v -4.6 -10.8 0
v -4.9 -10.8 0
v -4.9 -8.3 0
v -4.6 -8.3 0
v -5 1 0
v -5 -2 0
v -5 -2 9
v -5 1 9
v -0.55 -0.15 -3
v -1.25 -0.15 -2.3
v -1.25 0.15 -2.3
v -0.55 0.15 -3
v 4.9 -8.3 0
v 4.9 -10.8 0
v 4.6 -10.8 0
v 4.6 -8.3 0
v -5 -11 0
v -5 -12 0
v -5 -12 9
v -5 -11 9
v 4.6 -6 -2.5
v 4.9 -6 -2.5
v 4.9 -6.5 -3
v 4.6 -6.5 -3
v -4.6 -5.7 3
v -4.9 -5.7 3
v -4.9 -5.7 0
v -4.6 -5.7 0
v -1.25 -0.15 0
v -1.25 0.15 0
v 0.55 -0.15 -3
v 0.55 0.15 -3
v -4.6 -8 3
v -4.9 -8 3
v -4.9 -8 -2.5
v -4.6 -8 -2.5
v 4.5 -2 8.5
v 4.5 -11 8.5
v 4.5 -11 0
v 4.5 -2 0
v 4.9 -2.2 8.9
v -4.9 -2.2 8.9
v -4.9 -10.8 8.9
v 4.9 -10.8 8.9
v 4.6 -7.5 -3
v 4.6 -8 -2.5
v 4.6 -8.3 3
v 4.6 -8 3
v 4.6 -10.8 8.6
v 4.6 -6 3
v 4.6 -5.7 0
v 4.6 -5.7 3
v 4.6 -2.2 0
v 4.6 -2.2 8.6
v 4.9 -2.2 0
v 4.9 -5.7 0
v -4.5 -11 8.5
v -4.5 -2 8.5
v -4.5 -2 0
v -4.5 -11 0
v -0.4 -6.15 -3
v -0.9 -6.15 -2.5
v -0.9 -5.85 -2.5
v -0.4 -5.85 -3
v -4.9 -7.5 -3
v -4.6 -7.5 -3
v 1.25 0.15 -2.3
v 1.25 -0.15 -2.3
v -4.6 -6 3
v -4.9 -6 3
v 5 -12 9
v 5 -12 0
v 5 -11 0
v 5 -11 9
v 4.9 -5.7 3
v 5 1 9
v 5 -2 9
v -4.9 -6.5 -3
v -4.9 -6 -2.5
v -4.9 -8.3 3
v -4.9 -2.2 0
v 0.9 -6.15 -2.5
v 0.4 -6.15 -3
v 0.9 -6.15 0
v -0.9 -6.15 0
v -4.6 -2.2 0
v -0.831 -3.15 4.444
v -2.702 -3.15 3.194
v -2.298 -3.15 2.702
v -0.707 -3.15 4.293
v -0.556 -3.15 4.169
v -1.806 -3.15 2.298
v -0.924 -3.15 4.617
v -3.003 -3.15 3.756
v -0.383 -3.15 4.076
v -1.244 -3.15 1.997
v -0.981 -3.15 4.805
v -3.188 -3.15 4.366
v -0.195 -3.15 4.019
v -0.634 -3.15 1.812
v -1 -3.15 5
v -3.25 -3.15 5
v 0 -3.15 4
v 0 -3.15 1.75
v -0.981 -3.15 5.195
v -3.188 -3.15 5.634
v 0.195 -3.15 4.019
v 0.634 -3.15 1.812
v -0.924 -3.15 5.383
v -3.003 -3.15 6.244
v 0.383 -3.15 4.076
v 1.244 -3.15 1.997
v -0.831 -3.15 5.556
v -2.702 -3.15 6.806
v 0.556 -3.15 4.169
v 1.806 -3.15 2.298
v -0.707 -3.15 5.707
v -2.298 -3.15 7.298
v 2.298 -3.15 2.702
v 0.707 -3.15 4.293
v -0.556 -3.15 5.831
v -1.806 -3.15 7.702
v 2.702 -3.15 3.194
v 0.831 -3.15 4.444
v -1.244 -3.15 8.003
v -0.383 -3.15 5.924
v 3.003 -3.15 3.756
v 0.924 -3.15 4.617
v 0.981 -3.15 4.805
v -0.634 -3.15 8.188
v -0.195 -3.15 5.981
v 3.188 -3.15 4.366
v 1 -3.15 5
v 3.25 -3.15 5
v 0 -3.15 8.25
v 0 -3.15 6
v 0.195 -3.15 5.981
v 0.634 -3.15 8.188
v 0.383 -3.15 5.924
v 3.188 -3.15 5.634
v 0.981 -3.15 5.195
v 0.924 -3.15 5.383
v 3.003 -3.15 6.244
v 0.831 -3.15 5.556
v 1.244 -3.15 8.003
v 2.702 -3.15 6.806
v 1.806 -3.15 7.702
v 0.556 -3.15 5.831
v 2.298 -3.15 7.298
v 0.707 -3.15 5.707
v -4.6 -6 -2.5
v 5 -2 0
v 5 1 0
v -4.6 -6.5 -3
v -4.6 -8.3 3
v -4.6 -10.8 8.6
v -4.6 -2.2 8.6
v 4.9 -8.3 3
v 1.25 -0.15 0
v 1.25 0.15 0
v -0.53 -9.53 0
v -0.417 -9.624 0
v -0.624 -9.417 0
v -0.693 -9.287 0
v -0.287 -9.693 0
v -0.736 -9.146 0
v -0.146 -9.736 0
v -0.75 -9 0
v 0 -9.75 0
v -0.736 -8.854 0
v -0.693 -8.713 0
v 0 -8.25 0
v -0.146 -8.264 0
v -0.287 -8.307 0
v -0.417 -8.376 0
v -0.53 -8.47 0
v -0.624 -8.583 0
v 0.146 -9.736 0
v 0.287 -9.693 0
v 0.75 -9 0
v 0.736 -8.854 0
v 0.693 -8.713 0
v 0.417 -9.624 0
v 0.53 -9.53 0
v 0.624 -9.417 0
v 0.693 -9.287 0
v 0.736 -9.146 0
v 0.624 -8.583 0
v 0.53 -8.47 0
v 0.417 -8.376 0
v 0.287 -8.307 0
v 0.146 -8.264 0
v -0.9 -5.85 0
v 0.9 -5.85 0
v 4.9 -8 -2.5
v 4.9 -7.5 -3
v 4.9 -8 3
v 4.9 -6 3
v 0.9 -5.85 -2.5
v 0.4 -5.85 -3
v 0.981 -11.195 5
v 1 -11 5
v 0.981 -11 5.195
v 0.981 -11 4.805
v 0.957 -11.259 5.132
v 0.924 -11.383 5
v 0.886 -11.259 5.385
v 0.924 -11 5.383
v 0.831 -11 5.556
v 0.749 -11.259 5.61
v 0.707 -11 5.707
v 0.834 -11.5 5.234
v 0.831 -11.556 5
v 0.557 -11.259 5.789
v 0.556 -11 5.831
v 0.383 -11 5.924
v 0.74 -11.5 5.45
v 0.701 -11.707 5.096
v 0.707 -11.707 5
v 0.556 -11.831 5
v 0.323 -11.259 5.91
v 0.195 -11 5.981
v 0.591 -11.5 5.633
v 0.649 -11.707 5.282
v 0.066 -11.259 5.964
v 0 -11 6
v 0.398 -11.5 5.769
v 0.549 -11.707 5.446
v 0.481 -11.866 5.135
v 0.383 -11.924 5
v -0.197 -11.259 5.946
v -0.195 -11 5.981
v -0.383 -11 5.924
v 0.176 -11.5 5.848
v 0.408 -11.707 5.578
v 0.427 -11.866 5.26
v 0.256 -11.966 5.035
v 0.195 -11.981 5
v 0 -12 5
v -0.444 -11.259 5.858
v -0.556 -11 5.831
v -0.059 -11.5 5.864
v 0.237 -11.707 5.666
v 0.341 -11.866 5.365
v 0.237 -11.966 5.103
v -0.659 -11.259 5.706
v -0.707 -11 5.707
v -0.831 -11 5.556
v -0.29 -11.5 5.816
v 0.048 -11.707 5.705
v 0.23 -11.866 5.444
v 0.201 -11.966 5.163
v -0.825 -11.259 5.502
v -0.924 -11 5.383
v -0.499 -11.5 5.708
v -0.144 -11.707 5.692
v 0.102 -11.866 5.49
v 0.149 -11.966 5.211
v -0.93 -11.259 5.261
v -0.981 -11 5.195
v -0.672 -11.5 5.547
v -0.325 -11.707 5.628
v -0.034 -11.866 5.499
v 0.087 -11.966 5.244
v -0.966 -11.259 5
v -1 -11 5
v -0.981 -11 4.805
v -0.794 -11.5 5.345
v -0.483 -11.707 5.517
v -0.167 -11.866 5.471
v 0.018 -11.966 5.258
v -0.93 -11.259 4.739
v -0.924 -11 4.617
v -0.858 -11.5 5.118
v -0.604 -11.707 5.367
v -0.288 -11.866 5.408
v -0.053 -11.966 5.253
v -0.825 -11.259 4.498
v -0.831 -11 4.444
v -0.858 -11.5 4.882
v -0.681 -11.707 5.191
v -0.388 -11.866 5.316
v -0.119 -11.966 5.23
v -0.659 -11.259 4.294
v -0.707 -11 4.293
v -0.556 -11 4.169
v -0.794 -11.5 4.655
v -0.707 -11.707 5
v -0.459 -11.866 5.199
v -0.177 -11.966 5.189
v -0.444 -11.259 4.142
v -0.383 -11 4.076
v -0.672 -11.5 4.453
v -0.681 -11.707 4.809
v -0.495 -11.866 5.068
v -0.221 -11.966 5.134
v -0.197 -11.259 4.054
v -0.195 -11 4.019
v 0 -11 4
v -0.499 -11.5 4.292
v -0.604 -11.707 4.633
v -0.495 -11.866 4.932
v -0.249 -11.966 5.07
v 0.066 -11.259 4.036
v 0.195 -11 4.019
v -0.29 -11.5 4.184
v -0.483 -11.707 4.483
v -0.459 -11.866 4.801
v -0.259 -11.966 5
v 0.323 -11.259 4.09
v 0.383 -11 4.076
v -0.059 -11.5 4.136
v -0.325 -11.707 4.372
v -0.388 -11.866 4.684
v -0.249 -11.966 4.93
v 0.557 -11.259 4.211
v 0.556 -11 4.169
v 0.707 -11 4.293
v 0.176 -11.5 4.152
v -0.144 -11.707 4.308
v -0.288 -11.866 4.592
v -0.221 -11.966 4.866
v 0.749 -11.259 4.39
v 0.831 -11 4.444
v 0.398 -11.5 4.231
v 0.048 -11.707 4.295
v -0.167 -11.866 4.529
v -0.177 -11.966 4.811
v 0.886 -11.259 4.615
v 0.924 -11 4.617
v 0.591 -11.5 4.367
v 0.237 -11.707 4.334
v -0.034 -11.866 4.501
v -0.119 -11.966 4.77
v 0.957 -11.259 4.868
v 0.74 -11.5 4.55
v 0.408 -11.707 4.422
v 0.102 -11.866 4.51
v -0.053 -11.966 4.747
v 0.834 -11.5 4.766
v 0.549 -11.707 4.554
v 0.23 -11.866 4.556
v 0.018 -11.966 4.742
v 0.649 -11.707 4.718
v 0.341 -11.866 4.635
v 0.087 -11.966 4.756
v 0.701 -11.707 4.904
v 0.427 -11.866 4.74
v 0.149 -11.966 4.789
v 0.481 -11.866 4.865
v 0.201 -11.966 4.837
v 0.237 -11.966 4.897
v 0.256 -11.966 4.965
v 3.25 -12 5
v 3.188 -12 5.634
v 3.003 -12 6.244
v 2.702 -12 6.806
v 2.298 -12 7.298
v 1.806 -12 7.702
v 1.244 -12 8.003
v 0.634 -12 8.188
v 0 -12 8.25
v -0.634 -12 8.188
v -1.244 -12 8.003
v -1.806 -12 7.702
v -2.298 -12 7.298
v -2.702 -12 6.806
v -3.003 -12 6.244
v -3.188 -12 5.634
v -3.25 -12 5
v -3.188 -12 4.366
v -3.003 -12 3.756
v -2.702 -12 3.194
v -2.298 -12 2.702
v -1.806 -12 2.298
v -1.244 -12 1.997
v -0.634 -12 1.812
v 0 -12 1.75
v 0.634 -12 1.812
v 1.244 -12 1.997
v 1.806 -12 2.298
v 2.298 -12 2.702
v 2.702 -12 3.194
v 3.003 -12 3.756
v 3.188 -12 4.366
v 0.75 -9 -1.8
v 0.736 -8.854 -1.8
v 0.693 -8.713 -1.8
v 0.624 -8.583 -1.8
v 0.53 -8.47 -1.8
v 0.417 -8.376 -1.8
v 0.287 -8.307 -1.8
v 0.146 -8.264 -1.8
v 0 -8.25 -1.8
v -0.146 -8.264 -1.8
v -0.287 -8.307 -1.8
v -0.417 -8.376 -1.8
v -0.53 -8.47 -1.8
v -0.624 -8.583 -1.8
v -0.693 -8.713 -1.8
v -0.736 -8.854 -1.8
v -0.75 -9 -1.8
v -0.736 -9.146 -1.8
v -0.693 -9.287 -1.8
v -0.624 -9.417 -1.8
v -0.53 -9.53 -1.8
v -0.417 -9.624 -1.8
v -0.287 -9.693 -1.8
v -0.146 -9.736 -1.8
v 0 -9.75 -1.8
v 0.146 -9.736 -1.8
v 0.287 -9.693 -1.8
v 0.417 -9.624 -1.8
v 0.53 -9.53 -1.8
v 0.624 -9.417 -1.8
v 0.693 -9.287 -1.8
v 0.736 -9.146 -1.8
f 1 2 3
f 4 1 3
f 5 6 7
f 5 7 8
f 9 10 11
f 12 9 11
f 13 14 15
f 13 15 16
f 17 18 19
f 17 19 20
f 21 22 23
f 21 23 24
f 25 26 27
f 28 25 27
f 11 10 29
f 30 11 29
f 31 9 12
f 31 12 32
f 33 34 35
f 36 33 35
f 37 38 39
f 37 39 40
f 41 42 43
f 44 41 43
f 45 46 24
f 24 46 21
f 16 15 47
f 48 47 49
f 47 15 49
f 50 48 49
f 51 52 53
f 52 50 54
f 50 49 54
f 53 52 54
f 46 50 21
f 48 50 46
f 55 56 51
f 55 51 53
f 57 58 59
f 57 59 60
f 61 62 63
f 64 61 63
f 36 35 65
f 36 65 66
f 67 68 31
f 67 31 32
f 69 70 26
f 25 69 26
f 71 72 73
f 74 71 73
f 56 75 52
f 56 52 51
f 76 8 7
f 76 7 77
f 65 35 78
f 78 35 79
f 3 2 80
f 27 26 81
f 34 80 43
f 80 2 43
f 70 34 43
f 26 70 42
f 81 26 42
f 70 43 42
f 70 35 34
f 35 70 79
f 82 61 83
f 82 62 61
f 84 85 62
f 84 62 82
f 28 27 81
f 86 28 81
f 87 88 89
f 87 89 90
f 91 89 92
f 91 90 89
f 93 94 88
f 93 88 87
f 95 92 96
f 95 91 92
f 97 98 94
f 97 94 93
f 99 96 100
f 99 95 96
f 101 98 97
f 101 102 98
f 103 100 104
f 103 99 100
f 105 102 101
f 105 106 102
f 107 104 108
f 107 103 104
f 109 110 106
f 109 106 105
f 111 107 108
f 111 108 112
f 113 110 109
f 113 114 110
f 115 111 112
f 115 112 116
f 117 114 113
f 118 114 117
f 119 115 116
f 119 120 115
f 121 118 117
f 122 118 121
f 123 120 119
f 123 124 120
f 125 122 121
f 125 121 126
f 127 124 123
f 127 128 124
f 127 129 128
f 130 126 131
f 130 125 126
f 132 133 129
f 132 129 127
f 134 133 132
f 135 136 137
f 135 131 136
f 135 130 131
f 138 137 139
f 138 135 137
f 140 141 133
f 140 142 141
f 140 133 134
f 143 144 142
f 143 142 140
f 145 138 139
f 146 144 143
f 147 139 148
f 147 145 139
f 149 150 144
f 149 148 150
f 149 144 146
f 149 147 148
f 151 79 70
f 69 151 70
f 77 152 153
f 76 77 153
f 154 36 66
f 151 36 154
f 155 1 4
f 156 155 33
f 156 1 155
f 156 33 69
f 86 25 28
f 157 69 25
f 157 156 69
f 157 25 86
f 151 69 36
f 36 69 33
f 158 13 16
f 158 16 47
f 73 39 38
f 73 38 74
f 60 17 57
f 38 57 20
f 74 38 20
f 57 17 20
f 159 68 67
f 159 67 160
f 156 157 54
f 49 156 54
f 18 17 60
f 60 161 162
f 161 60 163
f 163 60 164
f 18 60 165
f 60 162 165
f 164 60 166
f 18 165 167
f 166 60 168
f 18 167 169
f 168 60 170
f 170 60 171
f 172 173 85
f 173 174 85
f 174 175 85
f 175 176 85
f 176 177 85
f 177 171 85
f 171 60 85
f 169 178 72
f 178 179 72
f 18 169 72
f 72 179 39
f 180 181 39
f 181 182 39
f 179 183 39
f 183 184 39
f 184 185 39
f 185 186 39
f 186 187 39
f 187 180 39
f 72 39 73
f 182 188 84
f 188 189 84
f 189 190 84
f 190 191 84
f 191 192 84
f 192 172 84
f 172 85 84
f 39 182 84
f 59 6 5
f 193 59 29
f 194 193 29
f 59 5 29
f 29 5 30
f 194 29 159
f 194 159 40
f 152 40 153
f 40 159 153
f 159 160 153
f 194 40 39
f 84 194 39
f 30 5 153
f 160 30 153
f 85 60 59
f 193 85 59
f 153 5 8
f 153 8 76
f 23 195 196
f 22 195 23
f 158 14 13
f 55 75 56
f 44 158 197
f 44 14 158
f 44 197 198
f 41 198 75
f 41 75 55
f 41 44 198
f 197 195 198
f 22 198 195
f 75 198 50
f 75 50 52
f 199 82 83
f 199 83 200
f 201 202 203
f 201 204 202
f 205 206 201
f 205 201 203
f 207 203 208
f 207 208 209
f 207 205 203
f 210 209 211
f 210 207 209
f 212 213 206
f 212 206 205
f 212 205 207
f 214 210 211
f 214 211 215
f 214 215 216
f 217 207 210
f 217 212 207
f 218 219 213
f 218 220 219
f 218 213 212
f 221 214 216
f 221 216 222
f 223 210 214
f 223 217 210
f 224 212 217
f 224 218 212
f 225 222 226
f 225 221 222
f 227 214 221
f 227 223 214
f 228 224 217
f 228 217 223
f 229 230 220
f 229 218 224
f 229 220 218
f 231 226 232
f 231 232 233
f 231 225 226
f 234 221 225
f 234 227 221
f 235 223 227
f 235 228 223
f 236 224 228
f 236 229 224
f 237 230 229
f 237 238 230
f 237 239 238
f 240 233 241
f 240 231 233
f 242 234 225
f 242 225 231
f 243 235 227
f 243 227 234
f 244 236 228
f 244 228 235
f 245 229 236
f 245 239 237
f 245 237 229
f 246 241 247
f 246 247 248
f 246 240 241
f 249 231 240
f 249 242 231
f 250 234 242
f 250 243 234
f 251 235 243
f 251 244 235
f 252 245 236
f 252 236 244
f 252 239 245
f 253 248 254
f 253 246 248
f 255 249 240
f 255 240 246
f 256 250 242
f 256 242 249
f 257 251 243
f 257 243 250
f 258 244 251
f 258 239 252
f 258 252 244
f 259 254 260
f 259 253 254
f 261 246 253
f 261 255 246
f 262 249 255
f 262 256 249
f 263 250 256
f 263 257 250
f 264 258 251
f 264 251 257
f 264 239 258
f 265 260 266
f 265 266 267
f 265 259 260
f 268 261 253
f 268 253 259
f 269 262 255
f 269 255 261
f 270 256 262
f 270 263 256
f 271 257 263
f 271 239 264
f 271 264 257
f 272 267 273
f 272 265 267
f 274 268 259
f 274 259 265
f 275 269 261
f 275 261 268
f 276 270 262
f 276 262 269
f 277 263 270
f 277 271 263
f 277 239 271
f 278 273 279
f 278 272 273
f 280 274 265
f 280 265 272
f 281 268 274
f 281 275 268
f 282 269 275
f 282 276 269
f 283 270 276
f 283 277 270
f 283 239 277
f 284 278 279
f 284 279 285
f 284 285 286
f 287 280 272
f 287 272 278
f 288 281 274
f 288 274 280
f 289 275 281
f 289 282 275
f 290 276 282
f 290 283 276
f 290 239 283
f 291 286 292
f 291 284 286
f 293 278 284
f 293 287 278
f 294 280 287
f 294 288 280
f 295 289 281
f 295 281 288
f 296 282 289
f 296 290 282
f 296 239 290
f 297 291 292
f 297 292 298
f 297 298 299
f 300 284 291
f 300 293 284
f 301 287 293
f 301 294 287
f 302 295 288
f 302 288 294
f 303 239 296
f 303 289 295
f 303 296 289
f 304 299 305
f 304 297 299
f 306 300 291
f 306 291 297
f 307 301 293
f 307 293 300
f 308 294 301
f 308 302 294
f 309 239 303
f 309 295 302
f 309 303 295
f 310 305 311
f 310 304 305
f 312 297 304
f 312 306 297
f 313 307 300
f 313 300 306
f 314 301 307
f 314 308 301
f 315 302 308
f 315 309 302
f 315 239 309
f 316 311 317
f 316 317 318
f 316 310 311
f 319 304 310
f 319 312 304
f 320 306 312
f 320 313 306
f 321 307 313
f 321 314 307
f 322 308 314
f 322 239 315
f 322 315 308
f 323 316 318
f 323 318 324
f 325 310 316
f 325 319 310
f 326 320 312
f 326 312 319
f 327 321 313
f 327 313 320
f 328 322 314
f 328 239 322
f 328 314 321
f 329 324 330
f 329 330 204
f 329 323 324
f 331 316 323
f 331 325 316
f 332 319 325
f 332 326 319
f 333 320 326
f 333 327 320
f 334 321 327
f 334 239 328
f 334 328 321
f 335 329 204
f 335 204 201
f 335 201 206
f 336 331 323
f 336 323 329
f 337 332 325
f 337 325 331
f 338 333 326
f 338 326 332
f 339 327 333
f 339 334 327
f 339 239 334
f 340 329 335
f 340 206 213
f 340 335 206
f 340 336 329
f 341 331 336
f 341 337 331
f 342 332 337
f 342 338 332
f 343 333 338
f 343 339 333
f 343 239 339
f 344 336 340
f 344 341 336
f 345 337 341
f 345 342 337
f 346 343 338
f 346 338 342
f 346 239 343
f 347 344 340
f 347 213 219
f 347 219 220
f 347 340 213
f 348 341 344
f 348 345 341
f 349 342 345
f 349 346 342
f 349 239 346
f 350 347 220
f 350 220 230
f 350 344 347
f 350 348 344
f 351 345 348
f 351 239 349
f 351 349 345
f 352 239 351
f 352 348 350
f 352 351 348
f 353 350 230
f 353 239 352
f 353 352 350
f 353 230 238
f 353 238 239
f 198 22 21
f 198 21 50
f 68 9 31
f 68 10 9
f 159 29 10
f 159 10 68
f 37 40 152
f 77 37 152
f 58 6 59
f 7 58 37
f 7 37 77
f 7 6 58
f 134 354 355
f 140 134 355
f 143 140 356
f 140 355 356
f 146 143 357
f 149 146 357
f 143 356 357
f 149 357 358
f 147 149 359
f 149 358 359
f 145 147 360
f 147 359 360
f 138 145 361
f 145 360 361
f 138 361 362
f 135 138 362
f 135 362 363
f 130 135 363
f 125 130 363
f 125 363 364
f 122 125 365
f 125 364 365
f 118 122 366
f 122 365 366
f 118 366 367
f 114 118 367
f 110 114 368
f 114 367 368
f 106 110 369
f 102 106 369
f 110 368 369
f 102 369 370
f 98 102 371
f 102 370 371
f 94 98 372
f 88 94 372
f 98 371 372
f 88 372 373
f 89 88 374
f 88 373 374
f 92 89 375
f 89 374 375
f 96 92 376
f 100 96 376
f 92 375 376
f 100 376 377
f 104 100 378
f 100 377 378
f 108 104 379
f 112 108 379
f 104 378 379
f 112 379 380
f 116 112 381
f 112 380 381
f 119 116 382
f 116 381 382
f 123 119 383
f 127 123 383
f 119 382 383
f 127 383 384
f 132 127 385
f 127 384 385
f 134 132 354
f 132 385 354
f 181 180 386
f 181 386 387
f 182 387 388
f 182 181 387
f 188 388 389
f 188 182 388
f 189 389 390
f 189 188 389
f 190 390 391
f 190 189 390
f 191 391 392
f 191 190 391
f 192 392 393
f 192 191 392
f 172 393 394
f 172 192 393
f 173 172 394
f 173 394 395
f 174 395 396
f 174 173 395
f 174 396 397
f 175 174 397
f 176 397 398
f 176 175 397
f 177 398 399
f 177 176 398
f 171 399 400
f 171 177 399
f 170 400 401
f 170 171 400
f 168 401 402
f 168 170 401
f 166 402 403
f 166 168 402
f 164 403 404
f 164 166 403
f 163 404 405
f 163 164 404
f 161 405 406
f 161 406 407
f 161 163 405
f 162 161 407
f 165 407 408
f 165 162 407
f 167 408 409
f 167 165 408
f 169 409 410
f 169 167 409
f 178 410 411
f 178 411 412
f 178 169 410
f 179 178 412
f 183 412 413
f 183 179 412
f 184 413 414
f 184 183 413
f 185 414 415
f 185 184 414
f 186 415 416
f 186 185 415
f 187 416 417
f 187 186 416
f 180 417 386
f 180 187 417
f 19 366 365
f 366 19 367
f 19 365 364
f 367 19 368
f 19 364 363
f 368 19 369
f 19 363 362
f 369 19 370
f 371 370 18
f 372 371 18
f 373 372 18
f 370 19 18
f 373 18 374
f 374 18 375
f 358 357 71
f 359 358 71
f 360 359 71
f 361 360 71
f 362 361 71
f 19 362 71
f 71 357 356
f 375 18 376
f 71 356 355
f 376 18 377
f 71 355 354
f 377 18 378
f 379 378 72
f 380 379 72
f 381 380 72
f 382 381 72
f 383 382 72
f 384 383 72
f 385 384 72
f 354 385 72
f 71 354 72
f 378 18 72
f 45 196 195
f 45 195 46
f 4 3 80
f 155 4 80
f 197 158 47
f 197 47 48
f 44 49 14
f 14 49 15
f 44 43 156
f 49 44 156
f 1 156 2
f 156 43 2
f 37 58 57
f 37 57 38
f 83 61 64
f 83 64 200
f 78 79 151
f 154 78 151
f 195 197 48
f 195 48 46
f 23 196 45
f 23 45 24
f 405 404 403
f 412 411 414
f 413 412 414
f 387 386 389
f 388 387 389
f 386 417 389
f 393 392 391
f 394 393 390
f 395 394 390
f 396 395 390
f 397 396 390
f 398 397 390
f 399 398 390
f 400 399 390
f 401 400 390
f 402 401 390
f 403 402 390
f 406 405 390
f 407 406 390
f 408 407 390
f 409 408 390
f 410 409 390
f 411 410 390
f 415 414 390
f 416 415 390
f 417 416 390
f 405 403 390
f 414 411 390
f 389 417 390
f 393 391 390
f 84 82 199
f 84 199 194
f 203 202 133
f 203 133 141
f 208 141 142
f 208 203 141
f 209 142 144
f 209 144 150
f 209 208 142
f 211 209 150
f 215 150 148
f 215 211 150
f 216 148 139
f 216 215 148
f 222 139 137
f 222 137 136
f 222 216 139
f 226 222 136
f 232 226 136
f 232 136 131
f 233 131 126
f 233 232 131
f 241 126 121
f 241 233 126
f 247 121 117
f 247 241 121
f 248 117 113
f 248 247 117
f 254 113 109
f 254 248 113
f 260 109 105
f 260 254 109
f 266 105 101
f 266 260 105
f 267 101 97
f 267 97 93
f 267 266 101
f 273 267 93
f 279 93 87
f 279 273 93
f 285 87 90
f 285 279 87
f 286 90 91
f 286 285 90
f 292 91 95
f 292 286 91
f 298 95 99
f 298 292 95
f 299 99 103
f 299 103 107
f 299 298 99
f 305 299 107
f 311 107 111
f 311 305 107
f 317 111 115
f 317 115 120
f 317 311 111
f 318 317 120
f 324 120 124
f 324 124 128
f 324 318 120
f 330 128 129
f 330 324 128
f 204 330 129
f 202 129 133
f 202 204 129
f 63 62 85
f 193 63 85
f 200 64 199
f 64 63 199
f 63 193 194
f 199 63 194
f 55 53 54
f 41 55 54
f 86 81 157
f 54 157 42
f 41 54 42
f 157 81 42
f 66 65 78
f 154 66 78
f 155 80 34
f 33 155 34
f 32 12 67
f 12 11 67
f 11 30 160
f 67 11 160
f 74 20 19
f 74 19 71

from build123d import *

# Parameters (mm, degrees)
SKETCH002_R     = 1
PAD001_DEPTH    = 8.85
FILLET_R        = 1
SKETCH003_W     = 2.5
SKETCH003_H     = 3
PAD002_DEPTH    = 0.3
CHAMFER_SIZE    = 0.7
CHAMFER001_SIZE = 0.7
SKETCH004_W     = 1.8
SKETCH004_H     = 3
PAD003_DEPTH    = 0.3
CHAMFER002_SIZE = 0.5
CHAMFER003_SIZE = 0.5
PAD004_DEPTH    = 0.3
CHAMFER004_SIZE = 0.5
CHAMFER005_SIZE = 0.5
SKETCH_W        = 10
SKETCH_H        = 13
PAD_DEPTH       = 9
SKETCH005_R     = 3.25
POCKET_DEPTH    = 8.85
SKETCH008_W     = 9
SKETCH008_H     = 9
POCKET001_DEPTH = 0.5
SKETCH009_W     = 9
SKETCH009_H     = 9
POCKET002_DEPTH = 0.5
SKETCH010_W     = 10
SKETCH010_H     = 9
POCKET003_DEPTH = 0.5
SKETCH011_W     = 9.8
SKETCH011_H     = 8.6
PAD006_DEPTH    = 0.3
SKETCH007_R     = 0.75
PAD005_DEPTH    = 1.8


with BuildPart() as centralpin:
    # Sketch002 → Pad001 (new body)
    with BuildSketch(Plane.XZ.offset(12)):
        with Locations((0, 5)):
            Circle(SKETCH002_R)
    extrude(amount=-PAD001_DEPTH)

    # Fillet
    fillet_edges = [centralpin.edges().sort_by_distance(p)[0] for p in [
        (-1, -12, 5),
    ]]
    fillet(fillet_edges, radius=FILLET_R)


with BuildPart() as pin1:
    # Sketch003 → Pad002 (new body)
    with BuildSketch(Plane.XZ.offset(0.15)):
        with Locations((0, -1.5)):
            Rectangle(SKETCH003_W, SKETCH003_H)
    extrude(amount=-PAD002_DEPTH)

    # Chamfer
    chamfer_edges = [pin1.edges().sort_by_distance(p)[0] for p in [
        (1.25, 0, -3),
    ]]
    chamfer(chamfer_edges, length=CHAMFER_SIZE)

    # Chamfer001
    chamfer001_edges = [pin1.edges().sort_by_distance(p)[0] for p in [
        (-1.25, 0, -3),
    ]]
    chamfer(chamfer001_edges, length=CHAMFER001_SIZE)


with BuildPart() as pin2:
    # Sketch004 → Pad003 (new body)
    with BuildSketch(Plane.XZ.offset(6.15)):
        with Locations((0, -1.5)):
            Rectangle(SKETCH004_W, SKETCH004_H)
    extrude(amount=-PAD003_DEPTH)

    # Chamfer002
    chamfer002_edges = [pin2.edges().sort_by_distance(p)[0] for p in [
        (0.9, -6, -3),
    ]]
    chamfer(chamfer002_edges, length=CHAMFER002_SIZE)

    # Chamfer003
    chamfer003_edges = [pin2.edges().sort_by_distance(p)[0] for p in [
        (-0.9, -6, -3),
    ]]
    chamfer(chamfer003_edges, length=CHAMFER003_SIZE)


with BuildPart() as pin3:
    # Sketch006 → Pad004 (new body)
    with BuildSketch(Plane.YZ.offset(4.9)):
        Polygon((-8, -3), (-6, -3), (-6, 0), (-6, 3), (-5.7, 3), (-5.7, 0), (-2.2, 0), (-2.2, 8.9), (-10.8, 8.9), (-10.8, 0), (-8.3, 0), (-8.3, 3), (-8, 3), (-8, 0), align=None)
    extrude(amount=-PAD004_DEPTH)

    # Chamfer004
    chamfer004_edges = [pin3.edges().sort_by_distance(p)[0] for p in [
        (4.75, -8, -3),
    ]]
    chamfer(chamfer004_edges, length=CHAMFER004_SIZE)

    # Chamfer005
    chamfer005_edges = [pin3.edges().sort_by_distance(p)[0] for p in [
        (4.75, -6, -3),
    ]]
    chamfer(chamfer005_edges, length=CHAMFER005_SIZE)


with BuildPart() as pins3:
    # Part__Mirroring: instance of Pin3
    add(pin3.part.mirror(Plane(origin=(0, -7, -1.5), x_dir=(0, -1, 0), z_dir=(1, 0, 0))))


with BuildPart() as body:
    # Sketch → Pad (new body)
    with BuildSketch(Plane.XY):
        with Locations((0, -5.5)):
            Rectangle(SKETCH_W, SKETCH_H)
    extrude(amount=PAD_DEPTH)

    # Sketch005 → Pocket (cut)
    with BuildSketch(Plane.XZ.offset(12)):
        with Locations((0, 5)):
            Circle(SKETCH005_R)
    extrude(amount=-POCKET_DEPTH, mode=Mode.SUBTRACT)

    # Sketch008 → Pocket001 (cut)
    with BuildSketch(Plane.YZ.offset(5)):
        with Locations((-6.5, 4.5)):
            Rectangle(SKETCH008_W, SKETCH008_H)
    extrude(amount=-POCKET001_DEPTH, mode=Mode.SUBTRACT)

    # Sketch009 → Pocket002 (cut)
    with BuildSketch(Plane(origin=(-5, 0, 0), x_dir=(0, -1, 0), z_dir=(-1, 0, 0))):
        with Locations((6.5, 4.5)):
            Rectangle(SKETCH009_W, SKETCH009_H)
    extrude(amount=-POCKET002_DEPTH, mode=Mode.SUBTRACT)

    # Sketch010 → Pocket003 (cut)
    with BuildSketch(Plane.XY.offset(9)):
        with Locations((0, -6.5)):
            Rectangle(SKETCH010_W, SKETCH010_H)
    extrude(amount=-POCKET003_DEPTH, mode=Mode.SUBTRACT)


with BuildPart() as shieldtop:
    # Sketch011 → Pad006 (new body)
    with BuildSketch(Plane.XY.offset(8.6)):
        with Locations((0, -6.5)):
            Rectangle(SKETCH011_W, SKETCH011_H)
    extrude(amount=PAD006_DEPTH)


with BuildPart() as barreljack_cui_pj_063ah_horizontal:
    # Sketch007 → Pad005 (new body)
    with BuildSketch(Plane.XY):
        with Locations((0, -9)):
            Circle(SKETCH007_R)
    extrude(amount=-PAD005_DEPTH)

    # Fusion: union CentralPin, Pin1, Pin2, Pins3, Pin3, Body, ShieldTop
    add(centralpin.part)
    add(pin1.part)
    add(pin2.part)
    add(pins3.part)
    add(pin3.part)
    add(body.part)
    add(shieldtop.part)


solid = barreljack_cui_pj_063ah_horizontal.part
